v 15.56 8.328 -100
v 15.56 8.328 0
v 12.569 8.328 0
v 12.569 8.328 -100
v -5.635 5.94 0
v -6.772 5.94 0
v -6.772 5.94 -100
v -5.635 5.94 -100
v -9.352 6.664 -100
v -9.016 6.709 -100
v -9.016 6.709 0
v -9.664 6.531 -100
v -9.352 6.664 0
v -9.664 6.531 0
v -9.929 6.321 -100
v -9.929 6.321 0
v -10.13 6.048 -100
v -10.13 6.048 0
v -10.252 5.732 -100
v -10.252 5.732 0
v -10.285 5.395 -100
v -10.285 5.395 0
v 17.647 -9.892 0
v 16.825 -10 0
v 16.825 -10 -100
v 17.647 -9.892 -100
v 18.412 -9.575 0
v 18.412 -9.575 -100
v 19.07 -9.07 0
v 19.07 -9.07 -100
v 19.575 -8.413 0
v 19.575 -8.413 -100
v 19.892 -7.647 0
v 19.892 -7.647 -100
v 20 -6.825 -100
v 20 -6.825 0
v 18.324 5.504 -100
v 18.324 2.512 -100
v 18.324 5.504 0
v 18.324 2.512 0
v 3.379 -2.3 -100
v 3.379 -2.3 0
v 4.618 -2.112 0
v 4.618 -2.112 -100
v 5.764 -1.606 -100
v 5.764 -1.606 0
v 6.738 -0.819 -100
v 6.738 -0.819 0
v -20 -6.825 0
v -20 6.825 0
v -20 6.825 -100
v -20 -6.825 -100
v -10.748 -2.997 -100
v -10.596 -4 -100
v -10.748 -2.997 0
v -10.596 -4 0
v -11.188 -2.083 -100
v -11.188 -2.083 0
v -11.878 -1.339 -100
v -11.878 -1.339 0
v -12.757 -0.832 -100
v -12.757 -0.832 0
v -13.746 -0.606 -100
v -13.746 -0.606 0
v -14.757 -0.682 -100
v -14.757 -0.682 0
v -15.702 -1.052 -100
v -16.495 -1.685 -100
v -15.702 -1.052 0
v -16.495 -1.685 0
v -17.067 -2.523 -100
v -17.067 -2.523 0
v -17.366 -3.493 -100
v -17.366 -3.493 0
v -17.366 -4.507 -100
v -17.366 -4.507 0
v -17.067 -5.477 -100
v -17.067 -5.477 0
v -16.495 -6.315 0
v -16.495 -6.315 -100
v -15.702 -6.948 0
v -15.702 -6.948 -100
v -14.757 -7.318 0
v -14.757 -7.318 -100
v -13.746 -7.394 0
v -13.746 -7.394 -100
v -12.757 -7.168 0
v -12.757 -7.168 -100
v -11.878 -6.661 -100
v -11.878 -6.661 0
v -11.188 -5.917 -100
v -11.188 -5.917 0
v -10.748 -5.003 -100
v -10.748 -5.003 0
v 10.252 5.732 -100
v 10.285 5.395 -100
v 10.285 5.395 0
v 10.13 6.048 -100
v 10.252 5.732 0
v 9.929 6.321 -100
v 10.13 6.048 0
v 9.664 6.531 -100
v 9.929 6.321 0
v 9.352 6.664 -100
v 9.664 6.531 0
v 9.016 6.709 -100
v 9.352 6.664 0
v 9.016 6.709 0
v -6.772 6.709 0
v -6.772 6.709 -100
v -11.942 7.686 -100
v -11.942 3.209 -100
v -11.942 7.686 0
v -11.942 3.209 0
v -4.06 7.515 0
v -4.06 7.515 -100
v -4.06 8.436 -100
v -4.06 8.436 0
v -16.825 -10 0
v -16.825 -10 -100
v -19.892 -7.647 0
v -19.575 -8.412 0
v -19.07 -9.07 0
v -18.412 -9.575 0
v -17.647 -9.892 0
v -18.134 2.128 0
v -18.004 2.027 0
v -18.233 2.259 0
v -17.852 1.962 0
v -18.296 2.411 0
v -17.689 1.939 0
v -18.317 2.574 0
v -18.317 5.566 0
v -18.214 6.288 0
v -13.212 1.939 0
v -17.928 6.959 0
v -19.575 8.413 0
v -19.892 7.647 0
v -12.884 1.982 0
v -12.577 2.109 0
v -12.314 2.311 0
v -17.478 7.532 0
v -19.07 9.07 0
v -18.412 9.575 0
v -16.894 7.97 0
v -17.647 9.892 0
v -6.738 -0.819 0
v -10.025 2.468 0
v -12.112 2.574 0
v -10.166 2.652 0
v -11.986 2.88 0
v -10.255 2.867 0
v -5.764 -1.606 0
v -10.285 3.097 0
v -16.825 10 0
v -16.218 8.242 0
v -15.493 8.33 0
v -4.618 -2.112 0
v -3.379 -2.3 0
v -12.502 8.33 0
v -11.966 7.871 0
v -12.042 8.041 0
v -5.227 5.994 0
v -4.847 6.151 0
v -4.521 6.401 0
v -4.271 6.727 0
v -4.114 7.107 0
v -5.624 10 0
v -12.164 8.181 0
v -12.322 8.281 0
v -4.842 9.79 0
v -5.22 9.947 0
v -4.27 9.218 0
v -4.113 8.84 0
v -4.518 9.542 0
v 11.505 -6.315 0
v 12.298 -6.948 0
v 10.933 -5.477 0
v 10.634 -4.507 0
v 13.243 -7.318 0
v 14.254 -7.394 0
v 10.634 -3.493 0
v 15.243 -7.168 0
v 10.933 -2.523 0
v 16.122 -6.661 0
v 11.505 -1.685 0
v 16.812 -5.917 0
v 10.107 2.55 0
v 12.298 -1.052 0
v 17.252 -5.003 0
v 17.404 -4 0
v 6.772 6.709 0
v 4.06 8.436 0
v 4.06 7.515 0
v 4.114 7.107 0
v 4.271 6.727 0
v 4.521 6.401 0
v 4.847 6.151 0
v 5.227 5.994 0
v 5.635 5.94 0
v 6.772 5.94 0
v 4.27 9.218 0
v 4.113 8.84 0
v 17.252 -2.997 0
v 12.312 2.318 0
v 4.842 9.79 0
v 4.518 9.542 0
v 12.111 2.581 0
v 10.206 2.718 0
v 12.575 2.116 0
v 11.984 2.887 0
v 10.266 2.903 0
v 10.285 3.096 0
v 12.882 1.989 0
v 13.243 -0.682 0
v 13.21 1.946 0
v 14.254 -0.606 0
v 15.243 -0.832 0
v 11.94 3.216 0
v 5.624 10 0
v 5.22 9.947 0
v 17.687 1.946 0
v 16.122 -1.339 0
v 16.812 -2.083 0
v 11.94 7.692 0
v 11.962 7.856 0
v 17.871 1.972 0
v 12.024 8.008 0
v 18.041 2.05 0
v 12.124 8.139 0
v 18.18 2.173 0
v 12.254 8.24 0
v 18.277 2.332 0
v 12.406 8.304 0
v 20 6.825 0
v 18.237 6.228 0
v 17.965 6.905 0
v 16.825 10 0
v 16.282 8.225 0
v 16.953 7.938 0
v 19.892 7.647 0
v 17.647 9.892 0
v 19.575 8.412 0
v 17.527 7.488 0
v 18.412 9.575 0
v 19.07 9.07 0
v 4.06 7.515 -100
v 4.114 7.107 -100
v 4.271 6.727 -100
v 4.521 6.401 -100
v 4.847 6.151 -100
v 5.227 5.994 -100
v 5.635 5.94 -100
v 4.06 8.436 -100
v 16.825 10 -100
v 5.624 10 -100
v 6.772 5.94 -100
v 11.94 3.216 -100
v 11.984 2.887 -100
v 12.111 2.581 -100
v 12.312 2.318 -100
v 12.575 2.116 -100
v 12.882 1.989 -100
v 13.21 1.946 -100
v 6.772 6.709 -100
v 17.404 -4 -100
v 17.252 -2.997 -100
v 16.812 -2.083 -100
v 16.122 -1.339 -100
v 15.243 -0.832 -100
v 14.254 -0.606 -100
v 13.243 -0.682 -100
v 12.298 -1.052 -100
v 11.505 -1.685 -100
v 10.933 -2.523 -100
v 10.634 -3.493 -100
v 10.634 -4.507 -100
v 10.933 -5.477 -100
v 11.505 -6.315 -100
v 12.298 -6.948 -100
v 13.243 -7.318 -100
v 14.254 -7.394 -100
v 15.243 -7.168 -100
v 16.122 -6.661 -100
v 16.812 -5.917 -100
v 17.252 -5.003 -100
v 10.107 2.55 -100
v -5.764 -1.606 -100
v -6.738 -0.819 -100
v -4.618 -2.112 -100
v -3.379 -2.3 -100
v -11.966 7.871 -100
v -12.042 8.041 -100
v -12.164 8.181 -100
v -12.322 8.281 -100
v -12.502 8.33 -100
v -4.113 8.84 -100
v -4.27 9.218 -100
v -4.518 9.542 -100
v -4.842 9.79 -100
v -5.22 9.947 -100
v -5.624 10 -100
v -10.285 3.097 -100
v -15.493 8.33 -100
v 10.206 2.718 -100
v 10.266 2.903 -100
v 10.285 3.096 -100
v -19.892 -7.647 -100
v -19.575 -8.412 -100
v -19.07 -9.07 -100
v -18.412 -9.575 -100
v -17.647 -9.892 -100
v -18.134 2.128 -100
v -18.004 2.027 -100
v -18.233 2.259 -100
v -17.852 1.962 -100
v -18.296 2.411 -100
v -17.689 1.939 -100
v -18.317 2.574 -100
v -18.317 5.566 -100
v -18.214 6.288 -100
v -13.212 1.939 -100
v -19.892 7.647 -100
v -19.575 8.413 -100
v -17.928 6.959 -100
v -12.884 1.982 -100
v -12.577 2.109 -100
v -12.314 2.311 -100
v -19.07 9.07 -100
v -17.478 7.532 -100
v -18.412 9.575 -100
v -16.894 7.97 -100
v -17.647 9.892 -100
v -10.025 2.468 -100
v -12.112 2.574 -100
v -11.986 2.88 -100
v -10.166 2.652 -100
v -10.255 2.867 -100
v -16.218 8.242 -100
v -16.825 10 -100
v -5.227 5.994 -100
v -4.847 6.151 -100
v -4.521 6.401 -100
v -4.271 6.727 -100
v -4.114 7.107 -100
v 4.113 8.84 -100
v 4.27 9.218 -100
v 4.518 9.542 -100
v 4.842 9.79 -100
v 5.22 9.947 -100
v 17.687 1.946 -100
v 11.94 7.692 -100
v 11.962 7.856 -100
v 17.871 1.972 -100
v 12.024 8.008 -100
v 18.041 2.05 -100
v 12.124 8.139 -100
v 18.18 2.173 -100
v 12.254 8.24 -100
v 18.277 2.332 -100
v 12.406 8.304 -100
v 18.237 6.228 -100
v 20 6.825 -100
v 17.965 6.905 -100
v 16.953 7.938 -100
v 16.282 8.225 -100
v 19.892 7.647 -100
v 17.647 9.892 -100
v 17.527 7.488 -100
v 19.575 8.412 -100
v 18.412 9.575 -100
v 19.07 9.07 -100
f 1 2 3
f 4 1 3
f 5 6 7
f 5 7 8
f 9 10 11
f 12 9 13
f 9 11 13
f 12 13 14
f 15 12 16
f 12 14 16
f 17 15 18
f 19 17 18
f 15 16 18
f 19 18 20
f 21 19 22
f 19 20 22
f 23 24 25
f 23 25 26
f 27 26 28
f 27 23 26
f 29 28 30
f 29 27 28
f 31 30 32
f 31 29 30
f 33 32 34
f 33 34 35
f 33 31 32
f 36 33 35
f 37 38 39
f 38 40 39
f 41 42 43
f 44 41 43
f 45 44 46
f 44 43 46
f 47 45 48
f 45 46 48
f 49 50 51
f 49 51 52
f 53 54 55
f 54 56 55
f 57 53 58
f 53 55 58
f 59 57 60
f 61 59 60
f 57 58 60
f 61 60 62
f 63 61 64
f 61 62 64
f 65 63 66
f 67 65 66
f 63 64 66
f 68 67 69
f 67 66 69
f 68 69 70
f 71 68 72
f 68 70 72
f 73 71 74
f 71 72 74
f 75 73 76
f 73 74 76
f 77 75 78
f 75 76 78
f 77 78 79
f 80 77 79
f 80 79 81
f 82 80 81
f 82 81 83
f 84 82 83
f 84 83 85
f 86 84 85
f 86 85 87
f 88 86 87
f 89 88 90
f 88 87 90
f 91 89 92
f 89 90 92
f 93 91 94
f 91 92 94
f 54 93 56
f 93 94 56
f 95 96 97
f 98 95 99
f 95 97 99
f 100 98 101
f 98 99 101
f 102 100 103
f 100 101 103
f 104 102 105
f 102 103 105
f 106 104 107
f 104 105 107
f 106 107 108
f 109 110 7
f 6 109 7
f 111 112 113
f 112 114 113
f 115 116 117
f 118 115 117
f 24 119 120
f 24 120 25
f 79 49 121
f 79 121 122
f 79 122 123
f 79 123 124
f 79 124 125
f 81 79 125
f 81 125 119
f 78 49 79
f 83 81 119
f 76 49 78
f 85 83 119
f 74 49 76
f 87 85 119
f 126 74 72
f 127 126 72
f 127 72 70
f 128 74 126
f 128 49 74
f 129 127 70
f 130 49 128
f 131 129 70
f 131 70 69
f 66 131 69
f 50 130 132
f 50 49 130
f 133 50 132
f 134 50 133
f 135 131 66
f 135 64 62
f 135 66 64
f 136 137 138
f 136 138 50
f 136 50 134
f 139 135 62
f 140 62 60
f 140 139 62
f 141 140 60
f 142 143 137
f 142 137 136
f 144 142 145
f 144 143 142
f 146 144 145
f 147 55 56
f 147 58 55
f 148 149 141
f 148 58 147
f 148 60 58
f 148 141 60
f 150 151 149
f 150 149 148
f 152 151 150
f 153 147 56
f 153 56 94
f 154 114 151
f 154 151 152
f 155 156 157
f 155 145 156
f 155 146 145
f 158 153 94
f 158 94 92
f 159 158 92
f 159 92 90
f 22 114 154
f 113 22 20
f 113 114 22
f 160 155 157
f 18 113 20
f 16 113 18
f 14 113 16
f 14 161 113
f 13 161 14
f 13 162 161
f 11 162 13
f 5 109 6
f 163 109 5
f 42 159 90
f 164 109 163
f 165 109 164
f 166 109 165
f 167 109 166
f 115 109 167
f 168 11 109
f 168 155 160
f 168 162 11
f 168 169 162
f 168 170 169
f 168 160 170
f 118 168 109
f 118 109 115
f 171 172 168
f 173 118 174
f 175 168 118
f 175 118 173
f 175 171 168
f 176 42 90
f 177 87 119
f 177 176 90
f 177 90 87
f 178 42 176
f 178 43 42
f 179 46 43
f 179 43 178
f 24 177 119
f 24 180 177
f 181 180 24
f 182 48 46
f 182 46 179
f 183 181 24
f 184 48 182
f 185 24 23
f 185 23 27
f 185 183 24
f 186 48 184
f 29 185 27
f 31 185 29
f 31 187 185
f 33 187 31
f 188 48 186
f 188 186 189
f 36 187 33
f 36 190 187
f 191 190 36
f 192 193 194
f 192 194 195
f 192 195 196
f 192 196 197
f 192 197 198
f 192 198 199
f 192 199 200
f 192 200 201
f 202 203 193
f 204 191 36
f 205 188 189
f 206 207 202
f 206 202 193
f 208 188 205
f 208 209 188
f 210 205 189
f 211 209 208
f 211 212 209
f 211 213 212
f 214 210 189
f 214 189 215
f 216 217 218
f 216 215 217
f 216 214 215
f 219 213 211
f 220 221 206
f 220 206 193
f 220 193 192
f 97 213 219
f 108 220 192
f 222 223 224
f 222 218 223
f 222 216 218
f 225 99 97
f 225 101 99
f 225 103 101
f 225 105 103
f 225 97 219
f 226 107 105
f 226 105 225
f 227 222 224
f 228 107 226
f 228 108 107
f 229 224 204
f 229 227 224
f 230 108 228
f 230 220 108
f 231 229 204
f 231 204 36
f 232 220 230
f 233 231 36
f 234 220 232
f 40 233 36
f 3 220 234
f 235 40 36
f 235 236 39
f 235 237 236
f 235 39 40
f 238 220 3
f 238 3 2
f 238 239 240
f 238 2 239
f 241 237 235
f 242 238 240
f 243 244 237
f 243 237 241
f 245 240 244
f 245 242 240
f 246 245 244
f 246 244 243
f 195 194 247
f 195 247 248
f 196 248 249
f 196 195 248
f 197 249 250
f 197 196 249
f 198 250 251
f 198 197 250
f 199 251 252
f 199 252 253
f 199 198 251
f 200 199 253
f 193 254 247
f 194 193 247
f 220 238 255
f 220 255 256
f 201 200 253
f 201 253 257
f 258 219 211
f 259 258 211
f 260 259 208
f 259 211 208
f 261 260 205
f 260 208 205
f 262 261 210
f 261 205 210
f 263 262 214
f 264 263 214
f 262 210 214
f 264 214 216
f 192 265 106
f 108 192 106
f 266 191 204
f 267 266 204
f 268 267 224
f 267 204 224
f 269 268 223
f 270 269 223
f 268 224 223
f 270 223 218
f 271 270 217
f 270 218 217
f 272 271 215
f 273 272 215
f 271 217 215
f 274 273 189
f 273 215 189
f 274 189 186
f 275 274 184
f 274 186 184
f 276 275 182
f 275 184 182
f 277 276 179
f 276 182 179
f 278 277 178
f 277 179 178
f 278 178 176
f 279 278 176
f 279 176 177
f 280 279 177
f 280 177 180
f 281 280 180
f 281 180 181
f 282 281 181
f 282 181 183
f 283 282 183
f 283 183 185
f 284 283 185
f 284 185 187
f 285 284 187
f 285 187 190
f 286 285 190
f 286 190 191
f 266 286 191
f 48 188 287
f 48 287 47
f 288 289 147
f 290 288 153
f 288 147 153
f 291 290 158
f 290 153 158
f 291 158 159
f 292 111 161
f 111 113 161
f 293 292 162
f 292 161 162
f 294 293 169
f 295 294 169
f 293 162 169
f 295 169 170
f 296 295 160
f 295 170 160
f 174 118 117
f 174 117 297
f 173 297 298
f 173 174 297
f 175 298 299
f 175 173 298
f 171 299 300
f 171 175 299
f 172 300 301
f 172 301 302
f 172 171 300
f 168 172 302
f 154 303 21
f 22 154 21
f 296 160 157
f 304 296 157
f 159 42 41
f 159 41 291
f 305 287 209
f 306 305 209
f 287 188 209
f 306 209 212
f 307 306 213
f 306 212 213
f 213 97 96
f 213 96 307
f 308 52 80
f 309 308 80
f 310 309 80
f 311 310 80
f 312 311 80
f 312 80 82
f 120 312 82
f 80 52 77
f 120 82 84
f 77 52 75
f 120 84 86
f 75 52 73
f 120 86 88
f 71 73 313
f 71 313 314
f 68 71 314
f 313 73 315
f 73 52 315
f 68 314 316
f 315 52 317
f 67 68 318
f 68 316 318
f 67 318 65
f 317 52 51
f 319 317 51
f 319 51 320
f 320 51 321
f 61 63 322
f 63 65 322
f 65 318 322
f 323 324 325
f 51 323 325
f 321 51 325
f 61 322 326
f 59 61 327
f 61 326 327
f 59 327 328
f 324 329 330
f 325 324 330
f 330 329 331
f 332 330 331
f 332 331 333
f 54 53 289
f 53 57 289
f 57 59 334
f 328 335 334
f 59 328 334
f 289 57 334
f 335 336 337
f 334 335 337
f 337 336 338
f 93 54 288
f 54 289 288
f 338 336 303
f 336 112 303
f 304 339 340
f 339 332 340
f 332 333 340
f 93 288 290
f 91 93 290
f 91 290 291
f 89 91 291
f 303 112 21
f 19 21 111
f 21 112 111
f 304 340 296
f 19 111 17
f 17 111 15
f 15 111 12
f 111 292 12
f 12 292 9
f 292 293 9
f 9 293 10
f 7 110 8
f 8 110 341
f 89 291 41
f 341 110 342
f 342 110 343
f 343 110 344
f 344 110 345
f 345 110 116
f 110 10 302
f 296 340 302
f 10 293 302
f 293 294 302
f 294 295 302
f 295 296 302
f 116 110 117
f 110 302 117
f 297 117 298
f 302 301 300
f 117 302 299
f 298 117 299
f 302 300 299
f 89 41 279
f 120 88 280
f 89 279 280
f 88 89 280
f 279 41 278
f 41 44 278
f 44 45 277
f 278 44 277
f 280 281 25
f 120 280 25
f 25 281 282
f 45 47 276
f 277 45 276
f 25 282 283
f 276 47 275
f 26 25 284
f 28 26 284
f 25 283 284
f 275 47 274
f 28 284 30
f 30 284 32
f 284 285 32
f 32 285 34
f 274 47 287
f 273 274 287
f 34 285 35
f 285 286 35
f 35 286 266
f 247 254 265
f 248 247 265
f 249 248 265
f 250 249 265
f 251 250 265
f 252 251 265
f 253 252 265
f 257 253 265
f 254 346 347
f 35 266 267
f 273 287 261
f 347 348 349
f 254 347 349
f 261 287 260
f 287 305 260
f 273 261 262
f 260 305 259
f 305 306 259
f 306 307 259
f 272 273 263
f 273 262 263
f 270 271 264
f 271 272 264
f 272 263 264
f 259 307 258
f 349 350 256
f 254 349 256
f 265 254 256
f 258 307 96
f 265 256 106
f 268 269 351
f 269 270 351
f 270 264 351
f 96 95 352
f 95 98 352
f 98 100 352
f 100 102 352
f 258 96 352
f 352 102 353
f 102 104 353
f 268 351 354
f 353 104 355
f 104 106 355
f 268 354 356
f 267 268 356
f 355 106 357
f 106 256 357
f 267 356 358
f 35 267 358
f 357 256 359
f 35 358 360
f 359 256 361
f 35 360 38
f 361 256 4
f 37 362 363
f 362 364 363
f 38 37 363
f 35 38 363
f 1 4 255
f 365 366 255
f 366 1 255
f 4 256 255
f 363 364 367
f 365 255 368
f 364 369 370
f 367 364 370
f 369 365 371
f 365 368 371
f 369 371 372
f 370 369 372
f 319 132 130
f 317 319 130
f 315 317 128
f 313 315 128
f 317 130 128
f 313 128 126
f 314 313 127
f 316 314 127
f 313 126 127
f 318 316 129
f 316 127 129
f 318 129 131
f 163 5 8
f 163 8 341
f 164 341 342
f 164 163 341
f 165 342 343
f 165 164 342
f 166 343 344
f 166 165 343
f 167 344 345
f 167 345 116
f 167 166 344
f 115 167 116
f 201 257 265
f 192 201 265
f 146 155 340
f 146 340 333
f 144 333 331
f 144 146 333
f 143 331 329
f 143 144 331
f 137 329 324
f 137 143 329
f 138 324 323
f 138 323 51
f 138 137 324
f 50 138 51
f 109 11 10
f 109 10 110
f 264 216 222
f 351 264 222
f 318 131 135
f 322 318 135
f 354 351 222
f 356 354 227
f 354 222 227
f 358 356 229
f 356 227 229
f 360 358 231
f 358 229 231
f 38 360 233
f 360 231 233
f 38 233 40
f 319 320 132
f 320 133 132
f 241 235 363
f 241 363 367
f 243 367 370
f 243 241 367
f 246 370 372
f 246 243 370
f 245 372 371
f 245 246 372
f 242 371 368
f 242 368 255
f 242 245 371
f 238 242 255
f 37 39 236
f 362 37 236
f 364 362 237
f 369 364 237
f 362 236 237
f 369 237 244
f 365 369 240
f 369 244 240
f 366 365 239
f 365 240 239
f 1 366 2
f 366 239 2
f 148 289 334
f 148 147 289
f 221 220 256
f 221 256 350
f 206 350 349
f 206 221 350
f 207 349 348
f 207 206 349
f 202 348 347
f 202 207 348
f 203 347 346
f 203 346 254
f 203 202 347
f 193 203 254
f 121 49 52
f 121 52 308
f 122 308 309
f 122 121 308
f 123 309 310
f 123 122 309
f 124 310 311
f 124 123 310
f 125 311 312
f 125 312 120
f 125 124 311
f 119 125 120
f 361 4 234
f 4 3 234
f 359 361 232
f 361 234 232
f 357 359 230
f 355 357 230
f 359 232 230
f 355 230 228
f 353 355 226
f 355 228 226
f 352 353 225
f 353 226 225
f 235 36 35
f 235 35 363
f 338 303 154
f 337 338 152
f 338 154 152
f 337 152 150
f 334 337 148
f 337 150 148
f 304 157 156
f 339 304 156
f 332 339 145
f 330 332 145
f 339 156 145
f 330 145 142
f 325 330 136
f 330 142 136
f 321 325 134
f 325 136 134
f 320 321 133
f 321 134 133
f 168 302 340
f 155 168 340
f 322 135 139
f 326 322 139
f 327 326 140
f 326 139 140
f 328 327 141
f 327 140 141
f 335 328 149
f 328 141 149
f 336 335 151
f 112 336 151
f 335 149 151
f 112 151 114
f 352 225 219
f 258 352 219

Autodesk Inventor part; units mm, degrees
ref_plane "YZ Plane" through (0, 0, 0) normal (1, 0, 0) x (0, 1, 0)
ref_plane "XZ Plane" through (0, 0, 0) normal (0, 1, 0) x (-1, 0, 0)
ref_plane "XY Plane" through (0, 0, 0) normal (0, 0, 1) x (1, 0, 0)
sketch "Sketch1" plane through (0, 0, 0) normal (0, 0, 1) x (1, 0, 0)
  arc A0 (17.687, 1.9459) -> (18.324, 2.5123) centre (17.6928, 2.5809) ccw
  line L0 (13.2104, 1.9459) -> (17.687, 1.9459)
  arc A1 (11.9404, 3.2159) -> (13.2104, 1.9459) centre (13.2104, 3.2159) ccw
  line L1 (11.9404, 7.6925) -> (11.9404, 3.2159)
  arc A2 (12.5686, 8.3275) -> (11.9404, 7.6925) centre (12.5754, 7.6925) ccw
  line L2 (15.5601, 8.3275) -> (12.5686, 8.3275)
  arc A3 (18.324, 5.5037) -> (15.5601, 8.3275) centre (15.5302, 5.5336) ccw
  line L3 (18.324, 2.5123) -> (18.324, 5.5037)
  circle A4 centre (14, -4) radius 3.4036
  circle A5 centre (-14, -4) radius 3.4036
  arc A6 (-13.2123, 1.9392) -> (-11.9423, 3.2092) centre (-13.2123, 3.2092) ccw
  line L4 (-17.6889, 1.9392) -> (-13.2123, 1.9392)
  arc A7 (-18.3171, 2.5742) -> (-17.6889, 1.9392) centre (-17.6821, 2.5742) ccw
  line L5 (-18.3171, 5.5656) -> (-18.3171, 2.5742)
  arc A8 (-15.4934, 8.3296) -> (-18.3171, 5.5656) centre (-15.5233, 5.5357) ccw
  line L6 (-12.5019, 8.3296) -> (-15.4934, 8.3296)
  arc A9 (-11.9423, 7.6857) -> (-12.5019, 8.3296) centre (-12.5772, 7.6991) ccw
  line L7 (-11.9423, 3.2092) -> (-11.9423, 7.6857)
  arc A10 (-16.825, 10) -> (-20, 6.825) centre (-16.825, 6.825) ccw
  line L8 (-20, 6.825) -> (-20, -6.825)
  arc A11 (-20, -6.825) -> (-16.825, -10) centre (-16.825, -6.825) ccw
  line L9 (-16.825, -10) -> (16.825, -10)
  arc A12 (16.825, -10) -> (20, -6.825) centre (16.825, -6.825) ccw
  line L10 (20, -6.825) -> (20, 6.825)
  arc A13 (20, 6.825) -> (16.825, 10) centre (16.825, 6.825) ccw
  line L11 (16.825, 10) -> (5.6244, 10)
  arc A14 (5.6244, 10) -> (4.06, 8.4356) centre (5.6244, 8.4356) ccw
  line L12 (4.06, 8.4356) -> (4.06, 7.5148)
  arc A15 (4.06, 7.5148) -> (5.6348, 5.94) centre (5.6348, 7.5148) ccw
  line L13 (5.6348, 5.94) -> (6.7718, 5.94)
  line L14 (6.7718, 5.94) -> (6.7718, 6.7089)
  line L15 (6.7718, 6.7089) -> (9.0158, 6.7089)
  arc A16 (10.285, 5.3946) -> (9.0158, 6.7089) centre (9.0158, 5.4389) ccw
  line L16 (10.285, 5.3946) -> (10.285, 3.0962)
  arc A17 (10.1069, 2.5504) -> (10.285, 3.0962) centre (9.3961, 3.0842) ccw
  line L17 (10.1069, 2.5504) -> (6.7378, -0.8187)
  arc A18 (3.3792, -2.3) -> (6.7378, -0.8187) centre (3.2907, 2.449) ccw
  line L18 (3.3792, -2.3) -> (-3.3792, -2.3)
  arc A19 (-6.7378, -0.8187) -> (-3.3792, -2.3) centre (-3.2907, 2.449) ccw
  line L19 (-6.7378, -0.8187) -> (-10.0246, 2.4681)
  arc A20 (-10.285, 3.0967) -> (-10.0246, 2.4681) centre (-9.396, 3.0967) ccw
  line L20 (-10.285, 3.0967) -> (-10.285, 5.3946)
  arc A21 (-9.0158, 6.7089) -> (-10.285, 5.3946) centre (-9.0158, 5.4389) ccw
  line L21 (-9.0158, 6.7089) -> (-6.7718, 6.7089)
  line L22 (-6.7718, 6.7089) -> (-6.7718, 5.94)
  line L23 (-6.7718, 5.94) -> (-5.6348, 5.94)
  arc A22 (-5.6348, 5.94) -> (-4.06, 7.5148) centre (-5.6348, 7.5148) ccw
  line L24 (-4.06, 7.5148) -> (-4.06, 8.4356)
  arc A23 (-4.06, 8.4356) -> (-5.6244, 10) centre (-5.6244, 8.4356) ccw
  line L25 (-5.6244, 10) -> (-16.825, 10)
  point P0 (0, 0)
extrude "Extrusion1" add sketch "Sketch1" against normal blind 100
properties part number "40-4020-BLACK-FB"
